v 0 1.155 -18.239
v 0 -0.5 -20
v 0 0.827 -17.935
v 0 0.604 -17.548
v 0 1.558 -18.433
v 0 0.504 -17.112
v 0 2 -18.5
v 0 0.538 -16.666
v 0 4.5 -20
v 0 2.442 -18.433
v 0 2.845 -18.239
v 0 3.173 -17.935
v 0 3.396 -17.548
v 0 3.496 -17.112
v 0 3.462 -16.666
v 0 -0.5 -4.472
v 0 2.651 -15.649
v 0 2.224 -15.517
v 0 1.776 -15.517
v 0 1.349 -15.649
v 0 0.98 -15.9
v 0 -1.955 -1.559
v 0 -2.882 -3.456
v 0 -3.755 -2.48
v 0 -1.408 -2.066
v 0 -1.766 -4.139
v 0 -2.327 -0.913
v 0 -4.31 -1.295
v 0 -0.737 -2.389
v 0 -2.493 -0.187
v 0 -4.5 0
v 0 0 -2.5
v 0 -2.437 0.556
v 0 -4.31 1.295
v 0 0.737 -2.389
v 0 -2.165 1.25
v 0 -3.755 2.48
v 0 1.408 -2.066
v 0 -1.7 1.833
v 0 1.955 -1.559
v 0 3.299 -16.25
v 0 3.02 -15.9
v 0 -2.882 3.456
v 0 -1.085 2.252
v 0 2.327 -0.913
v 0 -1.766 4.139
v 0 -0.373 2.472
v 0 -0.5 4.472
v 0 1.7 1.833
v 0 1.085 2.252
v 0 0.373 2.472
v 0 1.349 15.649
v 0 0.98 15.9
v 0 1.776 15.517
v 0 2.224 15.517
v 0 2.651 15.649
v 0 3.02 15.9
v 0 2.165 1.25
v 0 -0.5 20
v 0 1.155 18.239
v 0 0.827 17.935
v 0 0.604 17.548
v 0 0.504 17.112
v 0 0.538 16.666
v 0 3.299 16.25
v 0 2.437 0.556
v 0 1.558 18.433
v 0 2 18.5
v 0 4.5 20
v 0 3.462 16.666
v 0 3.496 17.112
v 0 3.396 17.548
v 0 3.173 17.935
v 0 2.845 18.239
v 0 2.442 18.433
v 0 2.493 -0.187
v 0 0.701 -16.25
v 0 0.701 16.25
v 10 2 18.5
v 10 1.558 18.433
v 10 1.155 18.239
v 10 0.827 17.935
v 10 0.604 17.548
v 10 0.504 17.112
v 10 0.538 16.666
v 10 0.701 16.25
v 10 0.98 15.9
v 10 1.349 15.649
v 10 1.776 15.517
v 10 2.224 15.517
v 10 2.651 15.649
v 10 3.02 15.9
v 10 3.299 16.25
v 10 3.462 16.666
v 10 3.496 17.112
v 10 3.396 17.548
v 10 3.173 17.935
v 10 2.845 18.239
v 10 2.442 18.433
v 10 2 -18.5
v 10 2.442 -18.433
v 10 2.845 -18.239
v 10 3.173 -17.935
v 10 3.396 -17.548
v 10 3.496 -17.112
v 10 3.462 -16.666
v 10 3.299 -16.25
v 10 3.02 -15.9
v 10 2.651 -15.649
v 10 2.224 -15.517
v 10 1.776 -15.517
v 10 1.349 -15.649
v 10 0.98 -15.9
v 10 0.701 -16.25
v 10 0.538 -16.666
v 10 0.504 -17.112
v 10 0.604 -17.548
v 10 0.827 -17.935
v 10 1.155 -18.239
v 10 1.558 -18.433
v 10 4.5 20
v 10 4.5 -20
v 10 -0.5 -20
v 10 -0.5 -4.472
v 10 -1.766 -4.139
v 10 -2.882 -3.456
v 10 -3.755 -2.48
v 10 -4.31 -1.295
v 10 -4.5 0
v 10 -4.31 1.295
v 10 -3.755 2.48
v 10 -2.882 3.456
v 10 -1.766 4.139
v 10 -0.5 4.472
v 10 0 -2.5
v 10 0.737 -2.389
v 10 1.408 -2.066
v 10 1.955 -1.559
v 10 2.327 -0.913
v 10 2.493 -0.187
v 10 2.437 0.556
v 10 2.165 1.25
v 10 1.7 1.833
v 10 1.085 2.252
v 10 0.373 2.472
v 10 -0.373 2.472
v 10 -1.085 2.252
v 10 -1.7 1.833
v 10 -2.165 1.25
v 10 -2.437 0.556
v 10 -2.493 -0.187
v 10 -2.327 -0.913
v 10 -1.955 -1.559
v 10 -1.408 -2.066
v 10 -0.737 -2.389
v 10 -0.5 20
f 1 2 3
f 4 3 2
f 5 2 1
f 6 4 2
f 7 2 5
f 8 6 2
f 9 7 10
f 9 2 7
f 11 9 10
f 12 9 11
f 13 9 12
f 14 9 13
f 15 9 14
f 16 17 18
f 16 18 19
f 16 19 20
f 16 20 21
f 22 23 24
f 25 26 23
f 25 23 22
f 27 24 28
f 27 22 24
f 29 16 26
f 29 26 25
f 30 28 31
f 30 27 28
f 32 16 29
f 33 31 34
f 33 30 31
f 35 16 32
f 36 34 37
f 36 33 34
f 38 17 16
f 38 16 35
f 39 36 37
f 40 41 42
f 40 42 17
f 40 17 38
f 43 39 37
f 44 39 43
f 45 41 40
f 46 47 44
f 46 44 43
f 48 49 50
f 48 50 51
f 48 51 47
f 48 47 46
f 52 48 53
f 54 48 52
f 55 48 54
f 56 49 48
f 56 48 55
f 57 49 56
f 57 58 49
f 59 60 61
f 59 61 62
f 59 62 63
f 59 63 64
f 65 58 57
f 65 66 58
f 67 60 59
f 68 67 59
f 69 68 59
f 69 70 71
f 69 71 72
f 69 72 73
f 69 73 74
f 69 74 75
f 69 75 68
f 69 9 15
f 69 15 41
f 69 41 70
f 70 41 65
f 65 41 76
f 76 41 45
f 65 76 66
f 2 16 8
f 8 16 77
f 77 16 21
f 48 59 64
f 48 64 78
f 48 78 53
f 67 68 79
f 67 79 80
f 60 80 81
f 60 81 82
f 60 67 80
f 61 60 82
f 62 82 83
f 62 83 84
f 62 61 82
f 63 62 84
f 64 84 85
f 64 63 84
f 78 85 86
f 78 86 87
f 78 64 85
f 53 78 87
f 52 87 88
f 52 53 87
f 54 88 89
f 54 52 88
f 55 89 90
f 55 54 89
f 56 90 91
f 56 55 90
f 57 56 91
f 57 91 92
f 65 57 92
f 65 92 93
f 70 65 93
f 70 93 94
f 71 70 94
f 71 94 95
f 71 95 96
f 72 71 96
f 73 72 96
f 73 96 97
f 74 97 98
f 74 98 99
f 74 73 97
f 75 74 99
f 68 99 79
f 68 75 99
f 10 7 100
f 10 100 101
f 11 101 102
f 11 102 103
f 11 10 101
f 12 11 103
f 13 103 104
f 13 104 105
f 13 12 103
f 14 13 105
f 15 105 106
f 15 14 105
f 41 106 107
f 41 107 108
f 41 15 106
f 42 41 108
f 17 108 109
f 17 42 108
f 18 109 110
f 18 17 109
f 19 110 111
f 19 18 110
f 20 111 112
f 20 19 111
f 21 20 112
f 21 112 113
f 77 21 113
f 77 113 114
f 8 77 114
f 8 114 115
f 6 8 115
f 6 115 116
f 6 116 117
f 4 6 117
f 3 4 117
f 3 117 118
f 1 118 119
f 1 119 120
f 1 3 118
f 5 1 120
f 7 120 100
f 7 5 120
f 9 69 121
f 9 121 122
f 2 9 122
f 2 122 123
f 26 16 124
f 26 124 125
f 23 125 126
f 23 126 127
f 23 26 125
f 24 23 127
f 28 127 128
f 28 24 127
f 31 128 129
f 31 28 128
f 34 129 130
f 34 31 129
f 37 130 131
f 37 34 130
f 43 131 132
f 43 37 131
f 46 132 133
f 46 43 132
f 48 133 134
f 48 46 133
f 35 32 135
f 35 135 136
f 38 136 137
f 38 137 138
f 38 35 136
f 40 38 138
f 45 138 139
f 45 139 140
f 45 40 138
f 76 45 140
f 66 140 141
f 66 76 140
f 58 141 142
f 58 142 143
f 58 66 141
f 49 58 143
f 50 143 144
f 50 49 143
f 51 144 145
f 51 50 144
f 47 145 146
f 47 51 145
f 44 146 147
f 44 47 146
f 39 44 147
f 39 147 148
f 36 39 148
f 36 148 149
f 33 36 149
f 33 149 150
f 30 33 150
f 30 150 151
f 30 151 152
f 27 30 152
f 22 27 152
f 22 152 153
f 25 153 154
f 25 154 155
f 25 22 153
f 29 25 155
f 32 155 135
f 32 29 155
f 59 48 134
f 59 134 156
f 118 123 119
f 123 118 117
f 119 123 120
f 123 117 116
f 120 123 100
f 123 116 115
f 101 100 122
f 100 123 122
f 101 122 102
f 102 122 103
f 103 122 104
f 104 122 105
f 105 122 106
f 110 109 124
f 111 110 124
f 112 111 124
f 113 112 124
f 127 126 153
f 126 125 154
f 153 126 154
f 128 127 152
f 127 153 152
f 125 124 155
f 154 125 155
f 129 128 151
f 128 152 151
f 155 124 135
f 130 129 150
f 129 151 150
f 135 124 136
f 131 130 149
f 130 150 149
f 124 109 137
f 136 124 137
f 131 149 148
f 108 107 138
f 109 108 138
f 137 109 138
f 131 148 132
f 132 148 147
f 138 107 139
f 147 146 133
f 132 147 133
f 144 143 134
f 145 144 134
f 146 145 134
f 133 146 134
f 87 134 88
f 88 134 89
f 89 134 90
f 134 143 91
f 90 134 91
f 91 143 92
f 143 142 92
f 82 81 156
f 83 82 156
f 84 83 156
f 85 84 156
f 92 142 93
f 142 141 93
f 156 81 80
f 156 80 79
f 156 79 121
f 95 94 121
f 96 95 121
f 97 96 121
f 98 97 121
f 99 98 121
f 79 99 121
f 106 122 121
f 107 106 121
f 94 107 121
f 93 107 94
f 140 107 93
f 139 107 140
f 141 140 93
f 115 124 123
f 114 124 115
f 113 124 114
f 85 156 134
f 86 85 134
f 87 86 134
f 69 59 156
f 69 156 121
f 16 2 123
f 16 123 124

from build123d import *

# Parameters (mm, degrees)
SZKIC1_R                    = 2.5
SZKIC1_R_2                  = 1.5
DODANIE_WYCI_GNI_CIE1_DEPTH = 10


with BuildPart() as part:
    # Szkic1 → Dodanie-wyciągnięcie1 (new body)
    with BuildSketch(Plane(origin=(0, 0, 0), x_dir=(0, 0, -1), z_dir=(1, 0, 0))):
        with BuildLine():
            Line((-20, 4.5), (20, 4.5))
            Line((20, 4.5), (20, -0.5))
            Line((20, -0.5), (4.472135955, -0.5))
            ThreePointArc((4.472135955, -0.5), (0, -4.5), (-4.472135955, -0.5))
            Line((-4.472135955, -0.5), (-20, -0.5))
            Line((-20, -0.5), (-20, 4.5))
        make_face()
        Circle(SZKIC1_R, mode=Mode.SUBTRACT)
        with Locations((17, 2)):
            Circle(SZKIC1_R_2, mode=Mode.SUBTRACT)
        with Locations(Location((-17, 2, 0), (0, 0, 180))):
            Circle(SZKIC1_R_2, mode=Mode.SUBTRACT)
    extrude(amount=DODANIE_WYCI_GNI_CIE1_DEPTH)


solid = part.part
